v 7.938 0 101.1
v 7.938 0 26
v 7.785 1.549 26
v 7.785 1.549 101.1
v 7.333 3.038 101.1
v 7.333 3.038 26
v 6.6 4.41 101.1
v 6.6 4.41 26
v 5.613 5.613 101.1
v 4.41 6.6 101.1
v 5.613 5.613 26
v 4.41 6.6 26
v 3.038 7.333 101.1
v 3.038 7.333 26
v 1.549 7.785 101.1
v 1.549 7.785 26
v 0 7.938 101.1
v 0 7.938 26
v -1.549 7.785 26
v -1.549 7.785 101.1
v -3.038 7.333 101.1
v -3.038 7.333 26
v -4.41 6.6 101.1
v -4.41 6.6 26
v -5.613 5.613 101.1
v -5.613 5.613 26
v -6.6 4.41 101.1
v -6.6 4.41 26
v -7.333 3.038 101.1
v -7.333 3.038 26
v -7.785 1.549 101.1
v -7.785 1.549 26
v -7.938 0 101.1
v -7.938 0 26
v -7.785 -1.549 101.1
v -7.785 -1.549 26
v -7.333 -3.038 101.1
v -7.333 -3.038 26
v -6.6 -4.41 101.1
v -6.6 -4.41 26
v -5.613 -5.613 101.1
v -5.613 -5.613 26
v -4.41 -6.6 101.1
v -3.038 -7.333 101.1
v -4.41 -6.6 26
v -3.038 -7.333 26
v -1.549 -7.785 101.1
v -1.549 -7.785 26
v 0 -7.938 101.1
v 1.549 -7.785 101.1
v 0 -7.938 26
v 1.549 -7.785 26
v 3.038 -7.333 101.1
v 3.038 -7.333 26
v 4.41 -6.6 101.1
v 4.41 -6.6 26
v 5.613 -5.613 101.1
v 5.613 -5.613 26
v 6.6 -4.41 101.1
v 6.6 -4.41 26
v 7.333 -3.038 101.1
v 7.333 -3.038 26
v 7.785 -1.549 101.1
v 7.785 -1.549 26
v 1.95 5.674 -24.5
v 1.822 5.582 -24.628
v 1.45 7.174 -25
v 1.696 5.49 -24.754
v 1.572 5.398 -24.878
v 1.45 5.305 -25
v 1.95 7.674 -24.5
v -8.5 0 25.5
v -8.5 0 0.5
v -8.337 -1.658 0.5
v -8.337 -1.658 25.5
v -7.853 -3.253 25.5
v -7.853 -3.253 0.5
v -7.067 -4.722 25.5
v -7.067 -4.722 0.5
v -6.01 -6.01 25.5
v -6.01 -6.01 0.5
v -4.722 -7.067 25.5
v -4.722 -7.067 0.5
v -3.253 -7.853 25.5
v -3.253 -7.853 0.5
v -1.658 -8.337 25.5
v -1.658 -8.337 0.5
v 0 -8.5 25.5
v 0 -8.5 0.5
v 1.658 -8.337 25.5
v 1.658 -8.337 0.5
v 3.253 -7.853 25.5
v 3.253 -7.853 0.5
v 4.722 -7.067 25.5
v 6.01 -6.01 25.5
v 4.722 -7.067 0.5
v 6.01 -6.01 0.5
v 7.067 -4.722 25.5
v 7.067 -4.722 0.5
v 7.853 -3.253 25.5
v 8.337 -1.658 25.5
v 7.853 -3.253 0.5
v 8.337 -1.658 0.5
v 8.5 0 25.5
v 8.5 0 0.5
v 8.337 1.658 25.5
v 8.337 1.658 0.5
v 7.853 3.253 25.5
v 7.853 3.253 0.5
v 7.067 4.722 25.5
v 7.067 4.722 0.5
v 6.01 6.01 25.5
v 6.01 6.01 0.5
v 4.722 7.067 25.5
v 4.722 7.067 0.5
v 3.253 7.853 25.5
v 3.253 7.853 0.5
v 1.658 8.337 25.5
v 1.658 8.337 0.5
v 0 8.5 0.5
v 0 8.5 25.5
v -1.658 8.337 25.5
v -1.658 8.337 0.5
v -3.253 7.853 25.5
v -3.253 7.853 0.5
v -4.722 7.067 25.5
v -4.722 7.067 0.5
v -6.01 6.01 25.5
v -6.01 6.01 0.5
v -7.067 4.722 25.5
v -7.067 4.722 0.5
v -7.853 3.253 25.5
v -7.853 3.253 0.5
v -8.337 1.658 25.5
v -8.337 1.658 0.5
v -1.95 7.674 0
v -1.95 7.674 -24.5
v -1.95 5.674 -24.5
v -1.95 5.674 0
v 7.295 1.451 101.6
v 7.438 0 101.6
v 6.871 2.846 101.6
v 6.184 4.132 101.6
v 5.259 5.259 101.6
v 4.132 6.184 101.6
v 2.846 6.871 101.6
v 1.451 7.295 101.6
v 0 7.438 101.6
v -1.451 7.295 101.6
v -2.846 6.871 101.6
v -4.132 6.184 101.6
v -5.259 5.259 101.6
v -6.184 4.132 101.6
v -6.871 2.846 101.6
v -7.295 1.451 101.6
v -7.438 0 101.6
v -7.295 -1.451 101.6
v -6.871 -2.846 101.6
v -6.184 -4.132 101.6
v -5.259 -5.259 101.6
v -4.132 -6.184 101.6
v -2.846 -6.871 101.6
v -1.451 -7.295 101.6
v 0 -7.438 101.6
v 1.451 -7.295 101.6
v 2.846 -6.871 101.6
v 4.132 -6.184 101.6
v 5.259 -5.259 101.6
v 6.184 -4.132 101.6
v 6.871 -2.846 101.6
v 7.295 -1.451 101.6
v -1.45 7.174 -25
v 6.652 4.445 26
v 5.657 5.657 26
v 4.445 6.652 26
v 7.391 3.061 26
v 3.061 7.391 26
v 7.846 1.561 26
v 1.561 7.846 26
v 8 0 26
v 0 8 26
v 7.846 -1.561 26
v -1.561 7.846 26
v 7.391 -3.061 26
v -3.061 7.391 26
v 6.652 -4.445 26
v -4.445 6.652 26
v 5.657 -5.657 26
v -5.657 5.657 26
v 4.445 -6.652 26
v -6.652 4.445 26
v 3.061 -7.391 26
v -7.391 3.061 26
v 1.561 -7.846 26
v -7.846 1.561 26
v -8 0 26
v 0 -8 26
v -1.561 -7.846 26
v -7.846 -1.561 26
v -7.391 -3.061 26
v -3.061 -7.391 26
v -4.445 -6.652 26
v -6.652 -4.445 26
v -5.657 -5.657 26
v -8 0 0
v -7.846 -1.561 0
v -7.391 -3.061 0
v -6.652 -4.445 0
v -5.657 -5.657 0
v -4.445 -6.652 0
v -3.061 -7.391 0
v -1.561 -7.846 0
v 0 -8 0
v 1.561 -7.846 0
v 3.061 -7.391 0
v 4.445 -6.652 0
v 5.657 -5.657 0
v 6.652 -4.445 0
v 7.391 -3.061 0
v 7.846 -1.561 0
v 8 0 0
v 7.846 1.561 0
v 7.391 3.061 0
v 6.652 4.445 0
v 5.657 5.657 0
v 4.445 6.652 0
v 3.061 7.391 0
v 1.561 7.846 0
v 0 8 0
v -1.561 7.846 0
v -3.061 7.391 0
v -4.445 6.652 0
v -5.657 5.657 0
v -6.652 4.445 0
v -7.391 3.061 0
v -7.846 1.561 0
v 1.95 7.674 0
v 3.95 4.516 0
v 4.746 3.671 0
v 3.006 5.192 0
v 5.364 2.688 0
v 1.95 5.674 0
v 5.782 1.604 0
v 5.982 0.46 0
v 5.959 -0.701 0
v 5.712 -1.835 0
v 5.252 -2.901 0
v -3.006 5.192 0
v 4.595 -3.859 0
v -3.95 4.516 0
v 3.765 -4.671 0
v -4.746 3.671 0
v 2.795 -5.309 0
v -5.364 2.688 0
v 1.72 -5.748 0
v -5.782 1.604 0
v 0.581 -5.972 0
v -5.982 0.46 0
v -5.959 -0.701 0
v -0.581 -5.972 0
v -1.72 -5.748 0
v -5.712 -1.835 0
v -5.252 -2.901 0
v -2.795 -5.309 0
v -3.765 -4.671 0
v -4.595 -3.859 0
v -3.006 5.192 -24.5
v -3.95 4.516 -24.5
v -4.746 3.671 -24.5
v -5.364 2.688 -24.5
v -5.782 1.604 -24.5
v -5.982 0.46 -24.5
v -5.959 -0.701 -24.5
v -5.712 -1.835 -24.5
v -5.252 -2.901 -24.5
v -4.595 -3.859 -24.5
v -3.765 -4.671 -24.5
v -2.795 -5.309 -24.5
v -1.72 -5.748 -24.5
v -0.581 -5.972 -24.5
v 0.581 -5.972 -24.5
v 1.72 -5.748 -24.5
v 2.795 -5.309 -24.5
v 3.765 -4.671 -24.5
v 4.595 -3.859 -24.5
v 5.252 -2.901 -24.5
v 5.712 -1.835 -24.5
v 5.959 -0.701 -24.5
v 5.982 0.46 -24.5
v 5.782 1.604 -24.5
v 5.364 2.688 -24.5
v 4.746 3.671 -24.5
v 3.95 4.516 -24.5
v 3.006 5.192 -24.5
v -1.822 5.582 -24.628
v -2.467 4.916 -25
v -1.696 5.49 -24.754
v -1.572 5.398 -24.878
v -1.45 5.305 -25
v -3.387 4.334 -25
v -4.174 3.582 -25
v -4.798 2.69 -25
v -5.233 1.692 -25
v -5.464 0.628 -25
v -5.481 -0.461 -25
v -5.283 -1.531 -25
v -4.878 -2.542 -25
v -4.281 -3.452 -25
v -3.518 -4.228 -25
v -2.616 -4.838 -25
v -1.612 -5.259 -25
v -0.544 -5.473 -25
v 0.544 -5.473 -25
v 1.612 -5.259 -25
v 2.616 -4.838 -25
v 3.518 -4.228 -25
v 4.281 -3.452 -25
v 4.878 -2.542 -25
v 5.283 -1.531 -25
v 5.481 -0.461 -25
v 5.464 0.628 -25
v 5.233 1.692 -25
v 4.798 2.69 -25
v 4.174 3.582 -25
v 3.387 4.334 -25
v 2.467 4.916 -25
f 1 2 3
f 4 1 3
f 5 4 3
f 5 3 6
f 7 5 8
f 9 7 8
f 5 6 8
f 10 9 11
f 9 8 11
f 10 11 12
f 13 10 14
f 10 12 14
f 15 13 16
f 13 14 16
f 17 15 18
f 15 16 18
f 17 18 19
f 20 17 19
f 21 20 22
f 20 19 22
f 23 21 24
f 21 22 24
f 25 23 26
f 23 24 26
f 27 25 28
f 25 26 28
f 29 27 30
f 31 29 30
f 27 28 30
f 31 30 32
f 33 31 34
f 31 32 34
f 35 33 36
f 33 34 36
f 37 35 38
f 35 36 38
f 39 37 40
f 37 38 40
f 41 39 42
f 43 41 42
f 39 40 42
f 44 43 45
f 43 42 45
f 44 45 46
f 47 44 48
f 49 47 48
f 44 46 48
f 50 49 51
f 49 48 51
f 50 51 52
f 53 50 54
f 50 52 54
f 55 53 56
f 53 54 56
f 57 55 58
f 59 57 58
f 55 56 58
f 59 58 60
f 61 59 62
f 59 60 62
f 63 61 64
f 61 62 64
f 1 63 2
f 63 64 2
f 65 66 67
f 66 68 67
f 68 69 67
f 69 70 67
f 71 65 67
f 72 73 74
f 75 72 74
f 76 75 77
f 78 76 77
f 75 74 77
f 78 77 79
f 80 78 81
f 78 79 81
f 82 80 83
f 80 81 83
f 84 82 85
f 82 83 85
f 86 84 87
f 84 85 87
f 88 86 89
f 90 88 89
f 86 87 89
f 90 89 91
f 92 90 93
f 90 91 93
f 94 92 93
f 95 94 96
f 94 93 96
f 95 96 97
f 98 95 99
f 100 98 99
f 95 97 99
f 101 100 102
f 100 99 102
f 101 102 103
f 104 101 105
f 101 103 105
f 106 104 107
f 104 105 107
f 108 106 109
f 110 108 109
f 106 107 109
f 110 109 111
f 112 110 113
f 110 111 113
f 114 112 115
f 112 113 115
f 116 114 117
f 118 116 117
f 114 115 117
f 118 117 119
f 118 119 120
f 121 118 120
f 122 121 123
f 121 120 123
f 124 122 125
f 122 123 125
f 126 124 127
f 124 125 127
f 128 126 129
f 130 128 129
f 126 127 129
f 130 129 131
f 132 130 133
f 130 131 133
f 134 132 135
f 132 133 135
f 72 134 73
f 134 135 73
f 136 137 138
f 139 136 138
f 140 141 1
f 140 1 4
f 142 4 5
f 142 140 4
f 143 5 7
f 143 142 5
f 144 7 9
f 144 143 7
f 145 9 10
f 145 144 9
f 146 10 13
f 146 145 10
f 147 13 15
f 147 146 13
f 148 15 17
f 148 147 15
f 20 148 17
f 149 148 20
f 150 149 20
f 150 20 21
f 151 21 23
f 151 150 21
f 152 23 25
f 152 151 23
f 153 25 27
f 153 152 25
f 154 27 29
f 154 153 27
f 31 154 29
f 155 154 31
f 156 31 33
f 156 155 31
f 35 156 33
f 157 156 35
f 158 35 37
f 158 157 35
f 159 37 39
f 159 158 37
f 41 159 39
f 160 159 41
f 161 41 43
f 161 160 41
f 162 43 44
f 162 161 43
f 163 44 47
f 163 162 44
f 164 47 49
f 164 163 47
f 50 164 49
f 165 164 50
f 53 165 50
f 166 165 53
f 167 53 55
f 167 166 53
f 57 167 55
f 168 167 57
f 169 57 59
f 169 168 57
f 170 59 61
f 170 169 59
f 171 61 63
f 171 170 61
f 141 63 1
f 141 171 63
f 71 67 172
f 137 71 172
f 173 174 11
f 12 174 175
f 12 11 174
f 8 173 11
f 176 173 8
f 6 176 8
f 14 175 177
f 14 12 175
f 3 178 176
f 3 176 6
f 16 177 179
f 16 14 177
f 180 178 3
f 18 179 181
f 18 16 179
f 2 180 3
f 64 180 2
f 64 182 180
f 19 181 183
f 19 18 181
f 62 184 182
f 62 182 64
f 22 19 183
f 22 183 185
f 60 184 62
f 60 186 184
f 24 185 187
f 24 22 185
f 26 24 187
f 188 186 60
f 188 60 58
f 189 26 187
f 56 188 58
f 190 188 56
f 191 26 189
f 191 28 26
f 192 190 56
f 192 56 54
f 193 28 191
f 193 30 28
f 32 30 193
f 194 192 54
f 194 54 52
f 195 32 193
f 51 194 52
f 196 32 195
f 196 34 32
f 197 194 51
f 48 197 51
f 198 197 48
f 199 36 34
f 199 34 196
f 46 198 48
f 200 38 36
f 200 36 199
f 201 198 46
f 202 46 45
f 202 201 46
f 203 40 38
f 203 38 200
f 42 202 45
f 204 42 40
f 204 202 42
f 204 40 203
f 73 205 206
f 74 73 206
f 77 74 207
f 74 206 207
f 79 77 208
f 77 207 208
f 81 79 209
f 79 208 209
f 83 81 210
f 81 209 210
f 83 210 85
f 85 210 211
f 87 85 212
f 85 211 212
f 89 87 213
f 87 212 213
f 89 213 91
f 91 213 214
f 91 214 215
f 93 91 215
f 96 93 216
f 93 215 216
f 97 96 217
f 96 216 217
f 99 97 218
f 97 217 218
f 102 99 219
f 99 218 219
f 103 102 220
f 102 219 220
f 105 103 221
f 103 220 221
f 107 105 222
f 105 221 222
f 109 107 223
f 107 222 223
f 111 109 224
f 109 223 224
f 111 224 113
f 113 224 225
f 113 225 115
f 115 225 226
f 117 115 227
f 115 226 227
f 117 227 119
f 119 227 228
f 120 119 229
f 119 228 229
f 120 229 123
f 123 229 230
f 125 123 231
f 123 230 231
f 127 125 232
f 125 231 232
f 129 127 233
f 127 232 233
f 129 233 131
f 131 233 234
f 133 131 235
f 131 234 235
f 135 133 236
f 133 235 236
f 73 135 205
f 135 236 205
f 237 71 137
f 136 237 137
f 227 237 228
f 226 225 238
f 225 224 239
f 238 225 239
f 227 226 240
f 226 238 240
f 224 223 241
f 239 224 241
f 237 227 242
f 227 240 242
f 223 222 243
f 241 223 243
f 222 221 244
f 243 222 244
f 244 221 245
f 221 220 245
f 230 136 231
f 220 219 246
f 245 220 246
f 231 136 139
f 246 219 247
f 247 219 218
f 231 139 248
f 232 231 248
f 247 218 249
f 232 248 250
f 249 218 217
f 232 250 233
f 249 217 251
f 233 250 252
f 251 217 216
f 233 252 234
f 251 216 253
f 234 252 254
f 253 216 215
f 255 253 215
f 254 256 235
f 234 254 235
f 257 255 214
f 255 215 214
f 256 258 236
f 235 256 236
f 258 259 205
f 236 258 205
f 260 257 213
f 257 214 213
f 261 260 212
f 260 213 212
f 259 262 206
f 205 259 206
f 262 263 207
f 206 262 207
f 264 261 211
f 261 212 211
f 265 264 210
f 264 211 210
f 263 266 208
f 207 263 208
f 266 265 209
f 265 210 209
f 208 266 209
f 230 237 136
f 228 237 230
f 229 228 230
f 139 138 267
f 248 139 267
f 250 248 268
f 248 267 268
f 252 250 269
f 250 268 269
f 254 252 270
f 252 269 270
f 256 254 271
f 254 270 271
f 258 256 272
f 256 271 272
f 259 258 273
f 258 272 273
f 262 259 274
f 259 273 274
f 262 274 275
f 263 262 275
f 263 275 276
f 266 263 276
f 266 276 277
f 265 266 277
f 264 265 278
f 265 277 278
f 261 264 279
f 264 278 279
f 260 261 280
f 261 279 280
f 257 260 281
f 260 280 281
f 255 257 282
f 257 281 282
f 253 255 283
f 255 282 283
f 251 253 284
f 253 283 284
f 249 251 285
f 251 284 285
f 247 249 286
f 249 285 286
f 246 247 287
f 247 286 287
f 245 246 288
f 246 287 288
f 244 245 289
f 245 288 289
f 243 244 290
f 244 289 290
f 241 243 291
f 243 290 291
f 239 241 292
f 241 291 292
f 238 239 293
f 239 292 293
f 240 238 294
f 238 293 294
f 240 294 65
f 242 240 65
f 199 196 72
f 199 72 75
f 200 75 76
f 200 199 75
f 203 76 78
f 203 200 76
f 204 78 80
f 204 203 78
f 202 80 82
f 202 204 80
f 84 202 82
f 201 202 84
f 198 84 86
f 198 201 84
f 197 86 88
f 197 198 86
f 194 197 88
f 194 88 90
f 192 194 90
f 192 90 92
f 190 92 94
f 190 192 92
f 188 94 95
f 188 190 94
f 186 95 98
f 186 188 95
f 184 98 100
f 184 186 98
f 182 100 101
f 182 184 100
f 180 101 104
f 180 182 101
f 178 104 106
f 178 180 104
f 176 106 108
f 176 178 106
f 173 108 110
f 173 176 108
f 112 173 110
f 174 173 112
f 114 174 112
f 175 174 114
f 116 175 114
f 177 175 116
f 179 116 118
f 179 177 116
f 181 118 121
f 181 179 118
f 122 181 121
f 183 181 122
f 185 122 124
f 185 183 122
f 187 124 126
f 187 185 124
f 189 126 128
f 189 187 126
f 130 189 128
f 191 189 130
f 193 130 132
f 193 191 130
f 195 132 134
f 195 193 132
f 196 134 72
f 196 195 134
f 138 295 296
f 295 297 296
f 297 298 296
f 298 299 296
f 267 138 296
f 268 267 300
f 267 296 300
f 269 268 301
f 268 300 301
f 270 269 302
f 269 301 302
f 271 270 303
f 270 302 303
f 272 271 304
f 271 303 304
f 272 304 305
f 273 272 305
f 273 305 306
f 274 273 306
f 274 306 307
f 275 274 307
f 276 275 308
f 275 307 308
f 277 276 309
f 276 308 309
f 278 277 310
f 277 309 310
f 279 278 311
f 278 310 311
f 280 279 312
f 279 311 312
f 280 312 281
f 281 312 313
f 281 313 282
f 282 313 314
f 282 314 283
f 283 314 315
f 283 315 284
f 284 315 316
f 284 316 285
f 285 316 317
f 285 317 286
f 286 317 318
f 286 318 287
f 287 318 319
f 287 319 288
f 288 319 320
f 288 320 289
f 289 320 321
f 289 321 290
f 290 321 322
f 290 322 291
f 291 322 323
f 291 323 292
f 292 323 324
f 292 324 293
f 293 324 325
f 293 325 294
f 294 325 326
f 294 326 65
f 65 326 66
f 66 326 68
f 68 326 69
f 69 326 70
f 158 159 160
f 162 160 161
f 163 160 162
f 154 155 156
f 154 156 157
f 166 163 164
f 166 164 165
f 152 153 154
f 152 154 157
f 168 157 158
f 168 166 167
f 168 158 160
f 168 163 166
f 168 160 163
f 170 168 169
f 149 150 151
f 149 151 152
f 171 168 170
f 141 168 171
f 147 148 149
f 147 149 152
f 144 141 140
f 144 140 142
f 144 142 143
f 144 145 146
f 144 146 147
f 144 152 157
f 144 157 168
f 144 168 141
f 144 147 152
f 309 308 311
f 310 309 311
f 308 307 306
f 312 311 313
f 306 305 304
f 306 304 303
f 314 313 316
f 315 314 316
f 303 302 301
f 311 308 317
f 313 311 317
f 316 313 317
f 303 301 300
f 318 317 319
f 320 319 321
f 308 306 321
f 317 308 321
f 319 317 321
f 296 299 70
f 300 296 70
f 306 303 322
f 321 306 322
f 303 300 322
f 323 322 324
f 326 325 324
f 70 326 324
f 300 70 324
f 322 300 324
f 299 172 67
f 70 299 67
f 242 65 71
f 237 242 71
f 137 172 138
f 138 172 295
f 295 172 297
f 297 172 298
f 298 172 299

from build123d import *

# Parameters (mm, degrees)
SKETCH2_R           = 6
BOSS_EXTRUDE1_DEPTH = 25.4
BOSS_EXTRUDE2_START = 25
BOSS_EXTRUDE2_DEPTH = 25
SKETCH4_R           = 8.5
BOSS_EXTRUDE3_DEPTH = 26
SKETCH6_R           = 7.9375
BOSS_EXTRUDE4_DEPTH = 75.6
CHAMFER1_SIZE       = 0.5


with BuildPart() as part:
    # Sketch2 → Boss-Extrude1 (new body)
    with BuildSketch(Plane.XY):
        Circle(SKETCH2_R)
    extrude(amount=BOSS_EXTRUDE1_DEPTH)

    # Sketch3 → Boss-Extrude2 (add)
    with BuildSketch(Plane(origin=(0, 0, 0), x_dir=(-1, 0, 0), z_dir=(0, 0, -1)).offset(BOSS_EXTRUDE2_START)):
        with BuildLine():
            Line((-1.95, 5.674284096), (-1.95, 7.674284096))
            Line((-1.95, 7.674284096), (1.95, 7.674284096))
            Line((1.95, 7.674284096), (1.95, 5.674284096))
            ThreePointArc((1.95, 5.674284096), (0, -6), (-1.95, 5.674284096))
        make_face()
    extrude(amount=-BOSS_EXTRUDE2_DEPTH)

    # Sketch4 → Boss-Extrude3 (add)
    with BuildSketch(Plane.XY):
        with Locations(Location((0, 0, 0), (0, 0, 180))):
            Circle(SKETCH4_R)
    extrude(amount=BOSS_EXTRUDE3_DEPTH)

    # Sketch6 → Boss-Extrude4 (add)
    with BuildSketch(Plane.XY.offset(26)):
        Circle(SKETCH6_R)
    extrude(amount=BOSS_EXTRUDE4_DEPTH)

    # Chamfer1
    chamfer1_edges = [part.edges().sort_by_distance(p)[0] for p in [
        (8.5, 0, 0),
        (8.5, 0, 26),
        (-7.9375, 0, 101.6),
        (0, -6, -25),
        (-1.95, 6.674284096, -25),
        (0, 7.674284096, -25),
        (1.95, 6.674284096, -25),
    ]]
    chamfer(chamfer1_edges, length=CHAMFER1_SIZE)


solid = part.part
